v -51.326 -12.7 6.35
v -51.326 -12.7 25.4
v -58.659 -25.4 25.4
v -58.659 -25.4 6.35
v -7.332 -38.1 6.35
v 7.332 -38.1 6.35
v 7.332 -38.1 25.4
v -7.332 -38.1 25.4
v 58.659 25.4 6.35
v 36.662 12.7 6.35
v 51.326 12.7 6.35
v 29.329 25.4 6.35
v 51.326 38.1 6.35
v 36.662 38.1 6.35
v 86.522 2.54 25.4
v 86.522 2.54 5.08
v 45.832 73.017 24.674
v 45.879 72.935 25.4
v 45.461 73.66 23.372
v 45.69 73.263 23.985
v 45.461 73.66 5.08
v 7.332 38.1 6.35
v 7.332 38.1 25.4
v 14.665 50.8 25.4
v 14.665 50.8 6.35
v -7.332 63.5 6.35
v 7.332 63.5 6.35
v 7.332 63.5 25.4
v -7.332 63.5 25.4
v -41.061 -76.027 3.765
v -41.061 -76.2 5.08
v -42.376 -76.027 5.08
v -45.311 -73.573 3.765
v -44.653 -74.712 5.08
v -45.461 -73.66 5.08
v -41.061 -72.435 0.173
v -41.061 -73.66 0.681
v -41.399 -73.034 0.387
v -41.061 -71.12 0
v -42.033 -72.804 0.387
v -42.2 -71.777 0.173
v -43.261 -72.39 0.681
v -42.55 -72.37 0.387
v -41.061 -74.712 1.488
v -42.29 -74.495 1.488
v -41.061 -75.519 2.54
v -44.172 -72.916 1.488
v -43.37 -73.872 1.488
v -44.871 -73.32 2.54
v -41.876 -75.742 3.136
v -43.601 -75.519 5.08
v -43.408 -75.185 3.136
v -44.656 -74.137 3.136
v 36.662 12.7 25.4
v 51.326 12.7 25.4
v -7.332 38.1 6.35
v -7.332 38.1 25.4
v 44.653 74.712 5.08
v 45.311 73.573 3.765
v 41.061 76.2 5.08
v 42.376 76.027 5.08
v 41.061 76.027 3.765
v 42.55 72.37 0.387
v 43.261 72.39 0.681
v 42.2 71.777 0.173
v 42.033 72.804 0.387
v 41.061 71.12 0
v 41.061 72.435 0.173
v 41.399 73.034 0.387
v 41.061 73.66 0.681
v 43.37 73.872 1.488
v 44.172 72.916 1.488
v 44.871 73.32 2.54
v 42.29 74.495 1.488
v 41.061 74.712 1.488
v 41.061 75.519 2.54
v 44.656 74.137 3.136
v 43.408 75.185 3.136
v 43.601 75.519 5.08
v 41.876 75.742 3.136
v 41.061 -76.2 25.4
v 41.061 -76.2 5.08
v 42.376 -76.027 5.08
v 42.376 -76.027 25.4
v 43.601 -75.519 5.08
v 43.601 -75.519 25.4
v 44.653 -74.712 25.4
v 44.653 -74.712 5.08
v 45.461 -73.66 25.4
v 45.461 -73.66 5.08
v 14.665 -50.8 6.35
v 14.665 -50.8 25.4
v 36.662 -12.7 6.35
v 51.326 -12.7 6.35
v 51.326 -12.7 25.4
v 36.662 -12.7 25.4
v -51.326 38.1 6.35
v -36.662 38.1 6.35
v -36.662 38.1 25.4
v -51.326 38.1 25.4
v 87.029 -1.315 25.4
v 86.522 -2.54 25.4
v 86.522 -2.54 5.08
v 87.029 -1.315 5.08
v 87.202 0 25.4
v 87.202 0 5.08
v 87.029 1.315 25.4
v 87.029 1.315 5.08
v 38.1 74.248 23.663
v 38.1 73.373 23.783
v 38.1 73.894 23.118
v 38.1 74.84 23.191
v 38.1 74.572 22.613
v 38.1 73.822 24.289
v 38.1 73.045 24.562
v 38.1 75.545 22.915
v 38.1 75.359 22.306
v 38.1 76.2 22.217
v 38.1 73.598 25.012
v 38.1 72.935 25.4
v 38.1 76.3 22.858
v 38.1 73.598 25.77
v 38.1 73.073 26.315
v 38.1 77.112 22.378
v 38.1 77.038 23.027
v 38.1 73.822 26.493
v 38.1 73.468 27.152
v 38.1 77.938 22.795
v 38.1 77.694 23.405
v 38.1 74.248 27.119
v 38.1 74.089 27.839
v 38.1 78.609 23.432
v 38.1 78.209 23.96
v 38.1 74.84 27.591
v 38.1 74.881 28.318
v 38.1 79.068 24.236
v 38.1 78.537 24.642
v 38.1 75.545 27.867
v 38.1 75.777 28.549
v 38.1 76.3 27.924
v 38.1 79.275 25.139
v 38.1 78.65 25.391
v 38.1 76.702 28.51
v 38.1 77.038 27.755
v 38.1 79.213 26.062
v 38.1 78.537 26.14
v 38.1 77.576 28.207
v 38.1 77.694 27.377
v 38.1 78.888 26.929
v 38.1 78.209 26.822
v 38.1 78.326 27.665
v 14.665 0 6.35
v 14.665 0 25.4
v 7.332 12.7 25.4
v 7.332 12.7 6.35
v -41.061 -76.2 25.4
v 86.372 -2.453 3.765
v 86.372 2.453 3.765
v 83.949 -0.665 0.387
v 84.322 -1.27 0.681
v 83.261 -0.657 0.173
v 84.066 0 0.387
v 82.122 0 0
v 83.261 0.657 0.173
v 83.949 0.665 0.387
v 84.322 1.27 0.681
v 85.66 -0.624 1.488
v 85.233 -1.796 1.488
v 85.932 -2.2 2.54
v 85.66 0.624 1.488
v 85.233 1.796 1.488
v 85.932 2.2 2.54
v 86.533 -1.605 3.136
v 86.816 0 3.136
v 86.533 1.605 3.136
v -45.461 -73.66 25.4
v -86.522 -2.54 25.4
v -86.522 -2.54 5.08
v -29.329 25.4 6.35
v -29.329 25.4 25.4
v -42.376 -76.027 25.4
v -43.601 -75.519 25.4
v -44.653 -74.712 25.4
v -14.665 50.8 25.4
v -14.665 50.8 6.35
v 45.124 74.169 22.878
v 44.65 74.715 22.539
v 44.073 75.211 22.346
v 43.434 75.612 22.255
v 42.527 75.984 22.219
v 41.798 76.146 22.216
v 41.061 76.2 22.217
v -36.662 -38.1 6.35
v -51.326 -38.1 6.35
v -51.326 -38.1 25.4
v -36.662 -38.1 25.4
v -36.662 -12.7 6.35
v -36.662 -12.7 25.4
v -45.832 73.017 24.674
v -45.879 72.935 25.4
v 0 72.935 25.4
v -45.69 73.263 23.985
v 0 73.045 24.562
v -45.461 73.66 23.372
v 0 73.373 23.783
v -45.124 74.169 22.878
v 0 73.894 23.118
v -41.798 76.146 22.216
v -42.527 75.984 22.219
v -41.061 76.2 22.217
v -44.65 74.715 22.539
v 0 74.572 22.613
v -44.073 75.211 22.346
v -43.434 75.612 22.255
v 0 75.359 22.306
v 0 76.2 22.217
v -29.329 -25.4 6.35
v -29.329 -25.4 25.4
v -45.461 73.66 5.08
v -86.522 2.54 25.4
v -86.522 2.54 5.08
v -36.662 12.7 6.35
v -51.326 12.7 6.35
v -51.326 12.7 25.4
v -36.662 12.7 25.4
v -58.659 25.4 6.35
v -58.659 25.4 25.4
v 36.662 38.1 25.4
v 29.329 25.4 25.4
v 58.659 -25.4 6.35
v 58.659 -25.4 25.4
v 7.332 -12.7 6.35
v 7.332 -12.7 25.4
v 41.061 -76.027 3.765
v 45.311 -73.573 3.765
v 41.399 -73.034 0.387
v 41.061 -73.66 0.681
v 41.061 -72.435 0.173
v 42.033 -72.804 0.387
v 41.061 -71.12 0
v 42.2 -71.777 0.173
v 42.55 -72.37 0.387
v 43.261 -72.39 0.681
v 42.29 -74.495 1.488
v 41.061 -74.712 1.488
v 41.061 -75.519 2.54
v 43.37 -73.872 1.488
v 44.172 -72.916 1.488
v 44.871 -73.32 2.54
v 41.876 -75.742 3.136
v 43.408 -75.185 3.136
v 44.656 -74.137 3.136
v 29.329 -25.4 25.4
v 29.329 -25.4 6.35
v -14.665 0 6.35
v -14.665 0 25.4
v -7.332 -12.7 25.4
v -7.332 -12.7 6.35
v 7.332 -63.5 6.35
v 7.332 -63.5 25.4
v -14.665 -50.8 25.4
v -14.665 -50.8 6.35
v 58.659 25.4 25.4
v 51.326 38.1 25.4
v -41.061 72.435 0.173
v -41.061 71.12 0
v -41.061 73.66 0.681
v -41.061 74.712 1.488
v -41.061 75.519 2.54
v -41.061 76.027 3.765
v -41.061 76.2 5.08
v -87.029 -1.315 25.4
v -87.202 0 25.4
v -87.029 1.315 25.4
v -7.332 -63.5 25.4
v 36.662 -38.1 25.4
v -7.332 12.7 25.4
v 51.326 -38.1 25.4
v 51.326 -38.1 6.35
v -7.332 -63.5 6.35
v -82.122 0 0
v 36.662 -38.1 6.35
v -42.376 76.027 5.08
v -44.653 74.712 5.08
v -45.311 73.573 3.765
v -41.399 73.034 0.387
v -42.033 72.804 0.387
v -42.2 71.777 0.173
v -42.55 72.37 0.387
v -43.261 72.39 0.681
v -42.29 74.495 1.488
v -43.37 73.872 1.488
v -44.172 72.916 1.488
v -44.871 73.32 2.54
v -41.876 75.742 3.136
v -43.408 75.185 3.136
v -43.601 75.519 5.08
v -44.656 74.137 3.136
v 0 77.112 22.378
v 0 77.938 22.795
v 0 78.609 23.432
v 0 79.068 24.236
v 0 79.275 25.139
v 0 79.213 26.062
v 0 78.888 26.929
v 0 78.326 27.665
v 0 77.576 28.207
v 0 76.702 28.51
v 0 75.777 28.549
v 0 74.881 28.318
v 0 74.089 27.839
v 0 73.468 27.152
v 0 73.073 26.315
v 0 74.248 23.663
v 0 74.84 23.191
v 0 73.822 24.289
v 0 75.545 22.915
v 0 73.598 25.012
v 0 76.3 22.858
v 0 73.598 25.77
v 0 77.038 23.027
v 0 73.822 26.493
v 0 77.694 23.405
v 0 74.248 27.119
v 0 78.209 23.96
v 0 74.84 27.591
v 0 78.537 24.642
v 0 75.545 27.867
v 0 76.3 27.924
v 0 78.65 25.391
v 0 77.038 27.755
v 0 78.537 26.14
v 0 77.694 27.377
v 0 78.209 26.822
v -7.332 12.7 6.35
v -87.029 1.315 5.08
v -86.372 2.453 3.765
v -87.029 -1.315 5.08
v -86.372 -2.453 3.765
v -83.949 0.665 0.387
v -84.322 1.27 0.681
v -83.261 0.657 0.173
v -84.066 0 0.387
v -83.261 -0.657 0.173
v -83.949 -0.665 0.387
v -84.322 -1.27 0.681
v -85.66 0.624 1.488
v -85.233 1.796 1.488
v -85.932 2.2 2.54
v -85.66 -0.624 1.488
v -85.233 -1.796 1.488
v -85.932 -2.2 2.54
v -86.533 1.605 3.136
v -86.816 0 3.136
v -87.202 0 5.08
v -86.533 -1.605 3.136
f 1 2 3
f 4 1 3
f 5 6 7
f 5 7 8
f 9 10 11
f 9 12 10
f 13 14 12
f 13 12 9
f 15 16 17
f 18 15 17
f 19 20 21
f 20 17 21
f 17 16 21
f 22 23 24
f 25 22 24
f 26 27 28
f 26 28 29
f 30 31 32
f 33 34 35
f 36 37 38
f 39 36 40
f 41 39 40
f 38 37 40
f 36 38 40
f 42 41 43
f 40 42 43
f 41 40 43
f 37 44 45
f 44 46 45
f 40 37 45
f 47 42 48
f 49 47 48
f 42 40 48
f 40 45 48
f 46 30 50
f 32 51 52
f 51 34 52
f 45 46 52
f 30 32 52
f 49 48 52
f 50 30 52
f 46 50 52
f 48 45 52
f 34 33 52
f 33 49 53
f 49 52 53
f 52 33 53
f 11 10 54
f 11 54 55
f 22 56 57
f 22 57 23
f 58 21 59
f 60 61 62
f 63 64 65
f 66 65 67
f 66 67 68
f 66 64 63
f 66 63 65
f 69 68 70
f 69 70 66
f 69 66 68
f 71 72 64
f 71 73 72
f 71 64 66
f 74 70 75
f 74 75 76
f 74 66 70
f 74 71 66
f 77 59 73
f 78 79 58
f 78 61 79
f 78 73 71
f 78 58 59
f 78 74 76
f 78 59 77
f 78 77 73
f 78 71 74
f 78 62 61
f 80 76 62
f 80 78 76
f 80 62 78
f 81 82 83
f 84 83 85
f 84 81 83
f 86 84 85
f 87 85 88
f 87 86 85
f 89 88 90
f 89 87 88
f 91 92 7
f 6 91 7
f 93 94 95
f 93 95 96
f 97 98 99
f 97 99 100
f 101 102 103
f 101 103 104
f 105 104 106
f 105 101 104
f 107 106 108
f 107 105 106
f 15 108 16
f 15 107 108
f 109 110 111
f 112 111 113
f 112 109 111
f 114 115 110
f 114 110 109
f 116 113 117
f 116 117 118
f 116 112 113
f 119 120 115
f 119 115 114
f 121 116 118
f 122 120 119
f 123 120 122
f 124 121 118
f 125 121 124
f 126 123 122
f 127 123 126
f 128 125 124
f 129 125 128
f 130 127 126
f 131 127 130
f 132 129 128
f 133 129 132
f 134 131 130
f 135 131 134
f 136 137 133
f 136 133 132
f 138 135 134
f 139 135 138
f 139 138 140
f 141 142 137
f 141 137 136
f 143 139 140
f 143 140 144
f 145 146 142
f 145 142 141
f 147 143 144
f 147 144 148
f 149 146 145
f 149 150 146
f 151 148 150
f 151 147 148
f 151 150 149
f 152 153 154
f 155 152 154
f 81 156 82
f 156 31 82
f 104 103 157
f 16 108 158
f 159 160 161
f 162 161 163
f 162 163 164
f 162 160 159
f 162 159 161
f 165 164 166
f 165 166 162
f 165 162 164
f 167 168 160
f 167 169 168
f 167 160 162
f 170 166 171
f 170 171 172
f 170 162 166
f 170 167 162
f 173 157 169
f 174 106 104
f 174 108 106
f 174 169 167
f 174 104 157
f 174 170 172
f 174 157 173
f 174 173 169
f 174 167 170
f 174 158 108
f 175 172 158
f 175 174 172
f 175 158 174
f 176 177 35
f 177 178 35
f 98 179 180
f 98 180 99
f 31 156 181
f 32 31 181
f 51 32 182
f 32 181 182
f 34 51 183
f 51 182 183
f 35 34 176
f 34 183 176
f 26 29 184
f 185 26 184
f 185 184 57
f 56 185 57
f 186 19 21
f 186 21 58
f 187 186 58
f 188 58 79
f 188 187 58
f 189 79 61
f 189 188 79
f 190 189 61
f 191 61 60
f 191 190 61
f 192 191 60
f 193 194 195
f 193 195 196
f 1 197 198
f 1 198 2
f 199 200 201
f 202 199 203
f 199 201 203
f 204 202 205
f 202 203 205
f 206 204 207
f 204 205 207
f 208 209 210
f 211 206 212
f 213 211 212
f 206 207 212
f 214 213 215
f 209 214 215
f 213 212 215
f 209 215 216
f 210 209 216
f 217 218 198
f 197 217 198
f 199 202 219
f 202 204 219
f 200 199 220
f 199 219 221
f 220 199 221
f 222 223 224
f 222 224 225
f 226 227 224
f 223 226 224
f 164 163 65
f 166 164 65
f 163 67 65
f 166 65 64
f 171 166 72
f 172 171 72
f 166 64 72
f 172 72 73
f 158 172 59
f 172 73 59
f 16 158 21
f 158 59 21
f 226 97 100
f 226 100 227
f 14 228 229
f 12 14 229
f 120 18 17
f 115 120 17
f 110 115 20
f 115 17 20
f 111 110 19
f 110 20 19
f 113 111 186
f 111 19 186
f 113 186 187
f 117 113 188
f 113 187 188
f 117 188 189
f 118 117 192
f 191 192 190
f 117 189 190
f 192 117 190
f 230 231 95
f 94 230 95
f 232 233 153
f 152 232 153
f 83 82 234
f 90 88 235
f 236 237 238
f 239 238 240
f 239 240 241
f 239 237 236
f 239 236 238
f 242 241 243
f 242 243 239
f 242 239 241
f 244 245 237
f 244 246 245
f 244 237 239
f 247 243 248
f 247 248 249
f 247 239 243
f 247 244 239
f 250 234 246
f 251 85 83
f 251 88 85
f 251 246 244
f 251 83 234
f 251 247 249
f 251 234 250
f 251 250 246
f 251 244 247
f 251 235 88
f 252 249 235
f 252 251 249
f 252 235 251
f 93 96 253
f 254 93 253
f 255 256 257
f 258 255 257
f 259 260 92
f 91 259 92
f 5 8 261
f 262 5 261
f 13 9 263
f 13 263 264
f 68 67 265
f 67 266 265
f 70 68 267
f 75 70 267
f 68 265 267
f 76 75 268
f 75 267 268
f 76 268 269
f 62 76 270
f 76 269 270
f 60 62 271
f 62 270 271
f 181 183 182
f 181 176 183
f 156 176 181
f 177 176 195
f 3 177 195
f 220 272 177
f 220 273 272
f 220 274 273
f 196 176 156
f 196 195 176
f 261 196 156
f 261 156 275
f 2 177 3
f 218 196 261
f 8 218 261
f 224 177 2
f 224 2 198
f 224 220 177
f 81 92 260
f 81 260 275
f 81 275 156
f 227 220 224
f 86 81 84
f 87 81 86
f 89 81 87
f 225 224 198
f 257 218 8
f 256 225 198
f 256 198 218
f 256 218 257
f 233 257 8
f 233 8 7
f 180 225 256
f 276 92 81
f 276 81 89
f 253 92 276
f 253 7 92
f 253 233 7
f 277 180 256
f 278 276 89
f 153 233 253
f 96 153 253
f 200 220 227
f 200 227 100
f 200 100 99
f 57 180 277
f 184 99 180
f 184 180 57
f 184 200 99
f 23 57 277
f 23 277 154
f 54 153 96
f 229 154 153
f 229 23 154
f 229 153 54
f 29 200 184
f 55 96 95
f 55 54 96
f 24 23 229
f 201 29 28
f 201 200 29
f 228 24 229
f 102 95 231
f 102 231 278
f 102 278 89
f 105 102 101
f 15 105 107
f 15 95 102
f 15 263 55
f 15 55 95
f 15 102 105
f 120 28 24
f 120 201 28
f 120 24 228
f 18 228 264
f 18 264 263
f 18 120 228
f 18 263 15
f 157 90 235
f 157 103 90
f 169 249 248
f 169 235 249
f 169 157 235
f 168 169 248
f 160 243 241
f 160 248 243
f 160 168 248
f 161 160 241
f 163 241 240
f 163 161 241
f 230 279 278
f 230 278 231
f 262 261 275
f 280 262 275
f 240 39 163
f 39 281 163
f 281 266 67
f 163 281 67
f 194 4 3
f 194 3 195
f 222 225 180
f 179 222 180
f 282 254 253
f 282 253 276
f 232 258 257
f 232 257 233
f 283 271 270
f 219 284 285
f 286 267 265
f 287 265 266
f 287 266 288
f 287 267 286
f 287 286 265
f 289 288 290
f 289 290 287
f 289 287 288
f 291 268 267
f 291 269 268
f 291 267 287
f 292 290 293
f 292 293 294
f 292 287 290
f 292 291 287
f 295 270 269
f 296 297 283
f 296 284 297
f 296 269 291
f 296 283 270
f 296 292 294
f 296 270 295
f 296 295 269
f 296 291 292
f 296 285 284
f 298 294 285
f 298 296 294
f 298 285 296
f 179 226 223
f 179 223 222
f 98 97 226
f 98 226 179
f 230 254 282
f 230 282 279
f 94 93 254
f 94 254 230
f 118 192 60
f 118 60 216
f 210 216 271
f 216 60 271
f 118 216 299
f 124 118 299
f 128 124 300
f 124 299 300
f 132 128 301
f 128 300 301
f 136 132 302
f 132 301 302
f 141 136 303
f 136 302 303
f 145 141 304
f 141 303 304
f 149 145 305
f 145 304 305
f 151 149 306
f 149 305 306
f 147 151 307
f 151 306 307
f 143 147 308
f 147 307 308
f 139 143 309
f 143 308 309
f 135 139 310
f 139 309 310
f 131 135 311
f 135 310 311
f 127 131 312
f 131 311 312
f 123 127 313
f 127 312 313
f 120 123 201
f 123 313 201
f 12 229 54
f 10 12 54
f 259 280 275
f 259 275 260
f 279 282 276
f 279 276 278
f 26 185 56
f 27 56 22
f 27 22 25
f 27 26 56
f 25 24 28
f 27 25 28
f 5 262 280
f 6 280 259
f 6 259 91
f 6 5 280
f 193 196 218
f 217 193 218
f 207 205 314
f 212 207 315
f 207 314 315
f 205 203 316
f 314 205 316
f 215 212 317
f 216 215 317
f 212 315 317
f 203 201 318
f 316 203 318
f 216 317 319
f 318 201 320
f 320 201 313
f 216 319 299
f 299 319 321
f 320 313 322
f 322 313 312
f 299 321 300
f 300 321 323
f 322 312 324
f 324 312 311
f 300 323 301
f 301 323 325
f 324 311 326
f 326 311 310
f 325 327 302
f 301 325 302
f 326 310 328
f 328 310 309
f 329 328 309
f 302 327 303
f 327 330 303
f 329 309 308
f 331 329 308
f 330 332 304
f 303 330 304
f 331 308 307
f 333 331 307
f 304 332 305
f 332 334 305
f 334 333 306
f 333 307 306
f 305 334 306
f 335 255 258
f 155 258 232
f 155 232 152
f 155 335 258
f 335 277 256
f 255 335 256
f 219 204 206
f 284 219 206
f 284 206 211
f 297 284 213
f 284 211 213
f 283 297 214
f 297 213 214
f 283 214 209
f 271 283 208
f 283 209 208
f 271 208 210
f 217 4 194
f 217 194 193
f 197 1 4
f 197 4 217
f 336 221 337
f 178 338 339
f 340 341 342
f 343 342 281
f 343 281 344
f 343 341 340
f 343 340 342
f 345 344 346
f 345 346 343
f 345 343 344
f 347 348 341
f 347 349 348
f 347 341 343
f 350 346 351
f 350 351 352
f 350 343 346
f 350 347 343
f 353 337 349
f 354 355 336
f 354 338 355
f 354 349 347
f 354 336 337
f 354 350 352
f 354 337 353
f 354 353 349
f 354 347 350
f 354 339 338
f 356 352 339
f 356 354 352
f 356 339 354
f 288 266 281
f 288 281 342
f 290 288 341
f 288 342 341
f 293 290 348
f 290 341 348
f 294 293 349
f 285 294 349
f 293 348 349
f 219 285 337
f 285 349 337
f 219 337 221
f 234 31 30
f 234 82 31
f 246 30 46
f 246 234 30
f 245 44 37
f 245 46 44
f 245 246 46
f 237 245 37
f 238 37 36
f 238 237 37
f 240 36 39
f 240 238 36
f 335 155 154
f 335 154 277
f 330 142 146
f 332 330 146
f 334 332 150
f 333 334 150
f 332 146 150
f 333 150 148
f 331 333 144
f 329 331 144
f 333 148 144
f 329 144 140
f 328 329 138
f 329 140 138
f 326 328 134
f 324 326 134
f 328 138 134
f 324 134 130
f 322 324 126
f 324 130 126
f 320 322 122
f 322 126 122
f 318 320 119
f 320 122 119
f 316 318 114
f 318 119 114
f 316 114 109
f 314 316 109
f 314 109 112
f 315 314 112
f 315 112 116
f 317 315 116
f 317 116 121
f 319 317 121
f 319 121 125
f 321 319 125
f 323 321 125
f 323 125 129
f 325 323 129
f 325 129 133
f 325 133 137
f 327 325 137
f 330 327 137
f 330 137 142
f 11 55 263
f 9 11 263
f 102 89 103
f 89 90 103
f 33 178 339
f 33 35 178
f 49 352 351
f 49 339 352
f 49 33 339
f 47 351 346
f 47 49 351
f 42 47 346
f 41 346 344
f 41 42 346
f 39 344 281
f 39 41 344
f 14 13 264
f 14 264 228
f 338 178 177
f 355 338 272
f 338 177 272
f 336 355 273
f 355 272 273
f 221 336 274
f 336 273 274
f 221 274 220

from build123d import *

# Parameters (mm, degrees)
F1_DEPTH      = 25.4
F3_DEPTH      = 19.05
F4_R          = 5.08
F5_R          = 3.175
F6_DEPTH      = 87.203302
F6_DEPTH_BACK = 87.203302
F7_DEPTH      = 38.1
F8_R          = 2.54
F9_DEPTH      = 125.303302


with BuildPart() as f1:
    # F0 (on Top) → F1 (new body)
    with BuildSketch(Plane.XY):
        Polygon((-43.994091, -76.2), (43.994091, -76.2), (87.988181, 0), (43.994091, 76.2), (-43.994091, 76.2), (-87.988181, 0), align=None)
    extrude(amount=F1_DEPTH)

    # F2 (on face) → F3 (cut)
    with BuildSketch(Plane.XY.offset(25.4)):
        Polygon((-7.332348, -12.7), (7.332348, -12.7), (14.664697, 0), (7.332348, 12.7), (-7.332348, 12.7), (-14.664697, 0), align=None)
        Polygon((-7.332348, 38.1), (7.332348, 38.1), (14.664697, 50.8), (7.332348, 63.5), (-7.332348, 63.5), (-14.664697, 50.8), align=None)
        Polygon((-29.329394, 25.4), (-36.661742, 38.1), (-51.326439, 38.1), (-58.658787, 25.4), (-51.326439, 12.7), (-36.661742, 12.7), align=None)
        Polygon((-36.661742, -12.7), (-51.326439, -12.7), (-58.658787, -25.4), (-51.326439, -38.1), (-36.661742, -38.1), (-29.329394, -25.4), align=None)
        Polygon((-7.332348, -38.1), (-14.664697, -50.8), (-7.332348, -63.5), (7.332348, -63.5), (14.664697, -50.8), (7.332348, -38.1), align=None)
        Polygon((29.329394, -25.4), (36.661742, -38.1), (51.326439, -38.1), (58.658787, -25.4), (51.326439, -12.7), (36.661742, -12.7), align=None)
        Polygon((36.661742, 12.7), (51.326439, 12.7), (58.658787, 25.4), (51.326439, 38.1), (36.661742, 38.1), (29.329394, 25.4), align=None)
    extrude(amount=-F3_DEPTH, mode=Mode.SUBTRACT)

    # F4
    f4_edges = [f1.edges().sort_by_distance(p)[0] for p in [
        (0, -76.2, 0),
        (65.991136, -38.1, 0),
        (65.991136, 38.1, 0),
        (0, 76.2, 0),
        (-65.991136, 38.1, 0),
        (-65.991136, -38.1, 0),
        (43.994091, -76.2, 12.7),
        (87.988181, 0, 12.7),
        (-43.994091, -76.2, 12.7),
        (-43.994091, 76.2, 12.7),
        (43.994091, 76.2, 12.7),
        (-87.988181, 0, 12.7),
    ]]
    fillet(f4_edges, radius=F4_R)

    # F5 (on Right) → F6 (cut, two sides)
    with BuildSketch(Plane.YZ) as f6_sk:
        with Locations((76.11011, 25.39102)):
            Circle(F5_R)
    extrude(amount=F6_DEPTH, mode=Mode.SUBTRACT)
    extrude(f6_sk.sketch, amount=-F6_DEPTH_BACK, mode=Mode.SUBTRACT)

    # F5 (on Right) → F7 (join)
    with BuildSketch(Plane.YZ):
        with Locations((76.11011, 25.39102)):
            Circle(F5_R)
    extrude(amount=F7_DEPTH)

    # F8 (on face) → F9 (cut, through all)
    with BuildSketch(Plane.YZ.offset(38.1)):
        with Locations((76.11011, 25.39102)):
            Circle(F8_R)
    extrude(amount=-F9_DEPTH, mode=Mode.SUBTRACT)


solid = f1.part
